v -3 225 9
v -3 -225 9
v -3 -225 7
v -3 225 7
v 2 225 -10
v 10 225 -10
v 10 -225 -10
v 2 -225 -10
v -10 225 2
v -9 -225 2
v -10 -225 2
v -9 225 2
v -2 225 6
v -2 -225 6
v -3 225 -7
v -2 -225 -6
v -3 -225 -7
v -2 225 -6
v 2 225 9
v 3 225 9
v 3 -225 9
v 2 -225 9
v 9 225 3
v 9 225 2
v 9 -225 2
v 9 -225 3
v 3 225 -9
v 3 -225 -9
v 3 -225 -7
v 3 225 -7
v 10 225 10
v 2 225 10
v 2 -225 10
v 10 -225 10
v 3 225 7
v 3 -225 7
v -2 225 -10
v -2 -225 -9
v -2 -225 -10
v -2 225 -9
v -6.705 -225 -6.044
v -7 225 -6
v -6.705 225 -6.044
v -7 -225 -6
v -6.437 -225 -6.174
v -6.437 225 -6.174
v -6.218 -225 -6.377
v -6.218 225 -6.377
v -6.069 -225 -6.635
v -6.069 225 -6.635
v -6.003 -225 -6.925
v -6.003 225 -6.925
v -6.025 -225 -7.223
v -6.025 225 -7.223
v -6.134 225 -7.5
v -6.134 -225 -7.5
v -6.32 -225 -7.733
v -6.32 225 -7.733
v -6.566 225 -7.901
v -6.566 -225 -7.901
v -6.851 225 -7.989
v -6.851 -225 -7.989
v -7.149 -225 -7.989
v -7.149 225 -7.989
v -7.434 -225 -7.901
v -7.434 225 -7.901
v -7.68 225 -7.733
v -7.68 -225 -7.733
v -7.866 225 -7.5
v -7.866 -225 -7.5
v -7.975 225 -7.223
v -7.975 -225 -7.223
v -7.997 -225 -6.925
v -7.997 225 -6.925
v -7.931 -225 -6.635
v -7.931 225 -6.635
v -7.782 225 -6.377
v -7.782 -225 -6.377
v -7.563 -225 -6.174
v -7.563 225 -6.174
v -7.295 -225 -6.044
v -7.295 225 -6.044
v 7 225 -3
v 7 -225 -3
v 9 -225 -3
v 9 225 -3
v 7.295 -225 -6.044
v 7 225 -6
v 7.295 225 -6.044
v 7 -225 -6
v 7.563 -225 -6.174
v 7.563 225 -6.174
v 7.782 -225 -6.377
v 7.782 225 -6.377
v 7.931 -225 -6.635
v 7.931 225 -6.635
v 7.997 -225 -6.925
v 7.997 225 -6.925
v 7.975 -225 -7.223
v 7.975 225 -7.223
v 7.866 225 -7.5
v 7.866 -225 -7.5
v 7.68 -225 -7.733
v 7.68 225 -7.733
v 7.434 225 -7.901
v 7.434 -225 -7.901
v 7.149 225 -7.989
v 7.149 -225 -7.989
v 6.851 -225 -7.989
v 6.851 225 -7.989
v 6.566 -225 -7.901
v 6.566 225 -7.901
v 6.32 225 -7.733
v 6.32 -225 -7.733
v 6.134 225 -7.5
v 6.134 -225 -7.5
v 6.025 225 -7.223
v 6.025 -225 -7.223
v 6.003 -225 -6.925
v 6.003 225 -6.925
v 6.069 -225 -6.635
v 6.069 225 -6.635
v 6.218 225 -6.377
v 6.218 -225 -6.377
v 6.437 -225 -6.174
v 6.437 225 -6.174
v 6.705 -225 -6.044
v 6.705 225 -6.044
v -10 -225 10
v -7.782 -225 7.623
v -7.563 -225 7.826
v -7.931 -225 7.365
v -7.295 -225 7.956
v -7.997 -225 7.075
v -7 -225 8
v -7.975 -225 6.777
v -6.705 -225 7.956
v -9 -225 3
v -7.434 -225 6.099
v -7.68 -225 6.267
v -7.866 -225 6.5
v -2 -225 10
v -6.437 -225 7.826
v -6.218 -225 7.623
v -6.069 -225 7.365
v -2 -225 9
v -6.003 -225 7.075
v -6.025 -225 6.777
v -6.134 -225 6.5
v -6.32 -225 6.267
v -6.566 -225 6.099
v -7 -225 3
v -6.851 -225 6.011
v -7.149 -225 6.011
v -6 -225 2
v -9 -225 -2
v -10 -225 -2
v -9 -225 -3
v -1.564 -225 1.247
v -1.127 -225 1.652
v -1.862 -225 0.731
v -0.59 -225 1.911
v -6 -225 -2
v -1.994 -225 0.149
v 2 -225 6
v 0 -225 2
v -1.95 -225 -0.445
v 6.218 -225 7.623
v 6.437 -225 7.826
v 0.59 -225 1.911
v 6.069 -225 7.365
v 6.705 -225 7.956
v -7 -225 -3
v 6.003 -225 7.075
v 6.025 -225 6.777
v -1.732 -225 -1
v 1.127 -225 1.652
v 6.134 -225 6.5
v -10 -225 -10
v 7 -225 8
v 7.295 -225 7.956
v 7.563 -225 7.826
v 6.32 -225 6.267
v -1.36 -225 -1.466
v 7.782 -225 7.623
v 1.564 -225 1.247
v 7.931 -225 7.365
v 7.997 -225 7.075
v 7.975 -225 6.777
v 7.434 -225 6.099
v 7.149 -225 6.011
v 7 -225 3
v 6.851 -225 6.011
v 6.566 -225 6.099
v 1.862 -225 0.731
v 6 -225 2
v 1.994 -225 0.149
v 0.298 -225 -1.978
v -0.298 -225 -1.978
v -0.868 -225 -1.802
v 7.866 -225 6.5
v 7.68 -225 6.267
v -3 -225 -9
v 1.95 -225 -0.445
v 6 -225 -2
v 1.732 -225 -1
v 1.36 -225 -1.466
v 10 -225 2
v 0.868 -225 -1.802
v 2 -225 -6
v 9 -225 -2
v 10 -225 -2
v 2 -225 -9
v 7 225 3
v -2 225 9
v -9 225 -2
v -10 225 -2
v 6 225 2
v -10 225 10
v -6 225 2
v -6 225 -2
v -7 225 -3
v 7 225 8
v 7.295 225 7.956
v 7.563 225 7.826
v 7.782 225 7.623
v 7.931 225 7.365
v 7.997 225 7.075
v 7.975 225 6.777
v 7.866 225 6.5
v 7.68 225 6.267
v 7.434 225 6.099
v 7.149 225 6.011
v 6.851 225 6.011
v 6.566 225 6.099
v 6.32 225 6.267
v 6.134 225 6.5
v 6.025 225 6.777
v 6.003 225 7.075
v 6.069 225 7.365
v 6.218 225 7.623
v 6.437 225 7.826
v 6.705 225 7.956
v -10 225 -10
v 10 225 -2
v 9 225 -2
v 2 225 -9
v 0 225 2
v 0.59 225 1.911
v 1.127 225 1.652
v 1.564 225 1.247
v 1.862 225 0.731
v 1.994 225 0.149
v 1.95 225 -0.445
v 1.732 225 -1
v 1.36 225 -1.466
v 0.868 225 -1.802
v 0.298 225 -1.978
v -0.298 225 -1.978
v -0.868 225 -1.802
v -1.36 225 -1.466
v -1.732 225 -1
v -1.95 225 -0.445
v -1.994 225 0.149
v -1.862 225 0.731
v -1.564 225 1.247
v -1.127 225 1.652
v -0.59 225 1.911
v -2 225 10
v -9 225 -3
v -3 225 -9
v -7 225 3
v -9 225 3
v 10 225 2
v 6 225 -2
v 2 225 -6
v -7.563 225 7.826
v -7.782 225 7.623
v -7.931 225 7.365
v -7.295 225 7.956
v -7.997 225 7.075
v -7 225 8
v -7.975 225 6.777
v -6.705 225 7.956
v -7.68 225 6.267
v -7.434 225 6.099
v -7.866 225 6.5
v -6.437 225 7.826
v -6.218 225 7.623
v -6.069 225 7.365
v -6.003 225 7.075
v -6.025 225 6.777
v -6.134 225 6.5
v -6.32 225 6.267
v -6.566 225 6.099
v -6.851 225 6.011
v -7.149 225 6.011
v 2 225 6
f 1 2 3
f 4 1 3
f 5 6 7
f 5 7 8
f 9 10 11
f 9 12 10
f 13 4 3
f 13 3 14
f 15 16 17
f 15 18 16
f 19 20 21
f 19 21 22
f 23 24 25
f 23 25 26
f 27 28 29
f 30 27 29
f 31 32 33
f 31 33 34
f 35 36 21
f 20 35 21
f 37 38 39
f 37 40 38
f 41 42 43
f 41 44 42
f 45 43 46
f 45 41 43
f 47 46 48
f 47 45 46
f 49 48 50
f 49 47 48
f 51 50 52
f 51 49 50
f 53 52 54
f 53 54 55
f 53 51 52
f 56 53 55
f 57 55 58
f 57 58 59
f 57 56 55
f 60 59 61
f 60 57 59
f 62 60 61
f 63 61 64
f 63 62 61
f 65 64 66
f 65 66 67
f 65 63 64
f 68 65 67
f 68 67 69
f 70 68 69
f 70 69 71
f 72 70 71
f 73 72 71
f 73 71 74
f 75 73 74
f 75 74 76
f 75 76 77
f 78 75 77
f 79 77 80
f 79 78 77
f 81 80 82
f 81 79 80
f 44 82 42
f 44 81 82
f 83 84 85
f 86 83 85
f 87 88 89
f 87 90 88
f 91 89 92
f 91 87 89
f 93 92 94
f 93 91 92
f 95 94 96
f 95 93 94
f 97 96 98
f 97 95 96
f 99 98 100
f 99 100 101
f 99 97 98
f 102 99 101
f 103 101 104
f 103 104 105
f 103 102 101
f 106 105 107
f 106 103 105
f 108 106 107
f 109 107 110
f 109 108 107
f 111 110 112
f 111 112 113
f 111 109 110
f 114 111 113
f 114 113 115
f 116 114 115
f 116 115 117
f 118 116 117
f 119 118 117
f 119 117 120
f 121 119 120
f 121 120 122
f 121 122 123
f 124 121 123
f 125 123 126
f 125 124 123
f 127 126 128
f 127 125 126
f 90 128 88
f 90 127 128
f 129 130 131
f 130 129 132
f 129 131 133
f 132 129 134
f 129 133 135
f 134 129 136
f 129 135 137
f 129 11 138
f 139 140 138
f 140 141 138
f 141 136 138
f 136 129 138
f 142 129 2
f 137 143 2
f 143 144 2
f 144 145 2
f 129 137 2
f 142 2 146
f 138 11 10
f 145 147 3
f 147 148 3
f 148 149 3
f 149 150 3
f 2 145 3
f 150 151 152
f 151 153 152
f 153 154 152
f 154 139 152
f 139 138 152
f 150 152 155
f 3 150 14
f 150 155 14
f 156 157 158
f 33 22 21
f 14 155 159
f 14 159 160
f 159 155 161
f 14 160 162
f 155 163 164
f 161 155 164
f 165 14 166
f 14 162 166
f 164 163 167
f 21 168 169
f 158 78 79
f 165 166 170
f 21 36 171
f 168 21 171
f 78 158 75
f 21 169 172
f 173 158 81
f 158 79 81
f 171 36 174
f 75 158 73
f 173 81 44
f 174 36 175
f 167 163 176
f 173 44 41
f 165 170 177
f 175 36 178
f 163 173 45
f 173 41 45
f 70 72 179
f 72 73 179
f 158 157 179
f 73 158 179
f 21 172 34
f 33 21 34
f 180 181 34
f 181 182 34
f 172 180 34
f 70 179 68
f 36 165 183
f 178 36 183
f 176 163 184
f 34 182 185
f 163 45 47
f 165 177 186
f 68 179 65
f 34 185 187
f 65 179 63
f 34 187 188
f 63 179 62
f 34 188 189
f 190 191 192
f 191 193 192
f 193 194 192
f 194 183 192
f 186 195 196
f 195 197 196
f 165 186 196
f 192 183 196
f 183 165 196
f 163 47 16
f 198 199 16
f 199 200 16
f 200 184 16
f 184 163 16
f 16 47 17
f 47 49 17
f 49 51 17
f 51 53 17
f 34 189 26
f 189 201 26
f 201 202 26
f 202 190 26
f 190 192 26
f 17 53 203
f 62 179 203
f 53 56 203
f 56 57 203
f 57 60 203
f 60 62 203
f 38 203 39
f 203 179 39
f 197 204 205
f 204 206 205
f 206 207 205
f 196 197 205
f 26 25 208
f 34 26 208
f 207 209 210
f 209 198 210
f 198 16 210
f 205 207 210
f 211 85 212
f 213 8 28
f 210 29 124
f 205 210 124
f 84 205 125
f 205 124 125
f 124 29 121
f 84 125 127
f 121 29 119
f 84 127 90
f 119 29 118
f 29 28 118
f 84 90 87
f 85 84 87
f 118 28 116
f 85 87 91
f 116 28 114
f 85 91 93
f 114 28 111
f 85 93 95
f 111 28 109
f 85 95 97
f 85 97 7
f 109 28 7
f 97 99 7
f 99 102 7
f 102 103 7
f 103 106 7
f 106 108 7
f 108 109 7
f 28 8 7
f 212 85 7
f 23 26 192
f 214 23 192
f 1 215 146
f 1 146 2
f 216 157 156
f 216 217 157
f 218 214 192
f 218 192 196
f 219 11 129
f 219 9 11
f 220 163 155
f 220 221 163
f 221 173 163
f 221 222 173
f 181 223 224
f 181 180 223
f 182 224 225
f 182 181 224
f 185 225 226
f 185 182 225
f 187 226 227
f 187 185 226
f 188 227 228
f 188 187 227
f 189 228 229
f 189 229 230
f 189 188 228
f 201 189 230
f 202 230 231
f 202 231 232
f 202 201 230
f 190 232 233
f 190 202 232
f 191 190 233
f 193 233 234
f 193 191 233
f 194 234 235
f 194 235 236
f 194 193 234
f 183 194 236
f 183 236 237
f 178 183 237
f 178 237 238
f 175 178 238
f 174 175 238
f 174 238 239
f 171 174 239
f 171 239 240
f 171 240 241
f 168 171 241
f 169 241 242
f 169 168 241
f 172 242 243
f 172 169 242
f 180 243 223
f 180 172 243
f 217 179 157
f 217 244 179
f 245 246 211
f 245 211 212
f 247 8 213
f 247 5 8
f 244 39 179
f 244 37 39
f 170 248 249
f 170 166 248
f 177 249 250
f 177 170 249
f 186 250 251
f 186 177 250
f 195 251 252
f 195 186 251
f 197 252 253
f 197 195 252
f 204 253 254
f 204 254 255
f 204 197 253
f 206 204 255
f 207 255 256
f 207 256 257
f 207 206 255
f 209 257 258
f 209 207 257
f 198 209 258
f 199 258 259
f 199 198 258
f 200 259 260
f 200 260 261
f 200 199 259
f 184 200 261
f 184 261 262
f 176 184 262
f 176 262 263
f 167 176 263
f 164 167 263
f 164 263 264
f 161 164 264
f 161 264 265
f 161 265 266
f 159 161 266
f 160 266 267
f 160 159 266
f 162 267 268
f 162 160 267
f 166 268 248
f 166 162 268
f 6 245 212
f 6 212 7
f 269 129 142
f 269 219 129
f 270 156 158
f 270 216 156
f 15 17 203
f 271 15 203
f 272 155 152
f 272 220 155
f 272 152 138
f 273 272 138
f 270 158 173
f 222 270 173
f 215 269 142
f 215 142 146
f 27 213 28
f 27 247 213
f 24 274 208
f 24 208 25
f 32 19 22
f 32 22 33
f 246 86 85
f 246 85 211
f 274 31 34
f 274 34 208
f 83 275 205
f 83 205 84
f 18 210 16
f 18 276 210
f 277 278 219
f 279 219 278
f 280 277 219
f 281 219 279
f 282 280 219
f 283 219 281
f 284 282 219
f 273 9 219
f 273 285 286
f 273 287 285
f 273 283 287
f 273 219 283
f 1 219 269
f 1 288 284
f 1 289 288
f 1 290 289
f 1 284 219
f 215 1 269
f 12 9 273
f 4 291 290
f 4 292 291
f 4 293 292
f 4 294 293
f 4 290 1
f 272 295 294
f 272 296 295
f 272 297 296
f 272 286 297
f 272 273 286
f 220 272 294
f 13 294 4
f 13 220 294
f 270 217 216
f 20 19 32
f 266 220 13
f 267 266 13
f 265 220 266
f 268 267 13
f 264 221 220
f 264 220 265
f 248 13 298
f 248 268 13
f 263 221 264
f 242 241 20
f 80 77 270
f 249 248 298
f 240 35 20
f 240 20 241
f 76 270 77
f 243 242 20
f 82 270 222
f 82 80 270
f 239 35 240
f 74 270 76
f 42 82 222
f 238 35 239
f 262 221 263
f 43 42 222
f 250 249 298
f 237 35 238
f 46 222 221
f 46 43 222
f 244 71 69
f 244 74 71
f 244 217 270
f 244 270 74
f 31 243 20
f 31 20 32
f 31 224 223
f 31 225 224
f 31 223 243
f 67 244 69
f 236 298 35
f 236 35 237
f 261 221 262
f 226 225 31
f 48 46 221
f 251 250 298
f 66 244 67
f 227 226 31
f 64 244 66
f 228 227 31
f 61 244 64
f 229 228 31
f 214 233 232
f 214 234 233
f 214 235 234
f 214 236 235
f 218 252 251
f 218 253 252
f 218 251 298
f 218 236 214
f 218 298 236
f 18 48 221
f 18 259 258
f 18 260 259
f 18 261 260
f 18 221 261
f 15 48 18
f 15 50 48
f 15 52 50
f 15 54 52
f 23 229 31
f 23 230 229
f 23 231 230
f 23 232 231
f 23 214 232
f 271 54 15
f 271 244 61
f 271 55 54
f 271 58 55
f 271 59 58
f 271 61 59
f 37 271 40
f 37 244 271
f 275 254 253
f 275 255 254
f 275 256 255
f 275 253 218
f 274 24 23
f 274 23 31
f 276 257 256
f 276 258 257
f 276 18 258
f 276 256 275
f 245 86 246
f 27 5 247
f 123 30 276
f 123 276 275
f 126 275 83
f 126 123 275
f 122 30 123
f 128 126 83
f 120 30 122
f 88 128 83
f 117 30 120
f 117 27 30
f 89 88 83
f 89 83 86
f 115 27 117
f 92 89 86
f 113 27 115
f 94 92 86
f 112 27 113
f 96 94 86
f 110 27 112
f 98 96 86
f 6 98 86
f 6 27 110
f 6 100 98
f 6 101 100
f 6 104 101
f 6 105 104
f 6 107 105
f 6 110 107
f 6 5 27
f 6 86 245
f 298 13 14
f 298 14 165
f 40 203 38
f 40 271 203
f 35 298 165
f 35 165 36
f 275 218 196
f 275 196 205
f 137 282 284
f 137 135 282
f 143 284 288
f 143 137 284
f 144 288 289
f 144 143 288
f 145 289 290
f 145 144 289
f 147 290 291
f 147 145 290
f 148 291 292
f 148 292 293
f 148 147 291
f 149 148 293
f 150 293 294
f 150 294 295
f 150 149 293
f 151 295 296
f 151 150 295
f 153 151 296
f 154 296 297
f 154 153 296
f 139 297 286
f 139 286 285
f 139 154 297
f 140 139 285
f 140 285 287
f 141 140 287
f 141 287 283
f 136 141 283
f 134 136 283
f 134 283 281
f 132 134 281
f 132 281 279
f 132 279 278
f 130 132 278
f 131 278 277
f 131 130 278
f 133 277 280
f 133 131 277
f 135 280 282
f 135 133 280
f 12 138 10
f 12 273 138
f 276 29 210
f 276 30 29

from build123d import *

# Parameters (mm, degrees)
SKETCH_1_R      = 2
SKETCH_1_R_2    = 1
EXTRUDE_1_DEPTH = 225


with BuildPart() as part:
    # 草圖1 → 填料-伸長1 (new, symmetric)
    with BuildSketch(Plane(origin=(0, 0, 0), x_dir=(1, 0, 0), z_dir=(0, 1, 0))):
        Polygon((-10, -10), (-2, -10), (-2, -9), (-3, -9), (-3, -7), (-2, -6), (2, -6), (3, -7), (3, -9), (2, -9), (2, -10), (10, -10), (10, -2), (9, -2), (9, -3), (7, -3), (6, -2), (6, 2), (7, 3), (9, 3), (9, 2), (10, 2), (10, 10), (2, 10), (2, 9), (3, 9), (3, 7), (2, 6), (-2, 6), (-3, 7), (-3, 9), (-2, 9), (-2, 10), (-10, 10), (-10, 2), (-9, 2), (-9, 3), (-7, 3), (-6, 2), (-6, -2), (-7, -3), (-9, -3), (-9, -2), (-10, -2), align=None)
        with Locations(Location((0, 0, 0), (0, 0, 270))):
            Circle(SKETCH_1_R, mode=Mode.SUBTRACT)
        with Locations(Location((-7, 7, 0), (0, 0, 270))):
            Circle(SKETCH_1_R_2, mode=Mode.SUBTRACT)
        with Locations(Location((7, 7, 0), (0, 0, 270))):
            Circle(SKETCH_1_R_2, mode=Mode.SUBTRACT)
        with Locations(Location((7, -7, 0), (0, 0, 270))):
            Circle(SKETCH_1_R_2, mode=Mode.SUBTRACT)
        with Locations(Location((-7, -7, 0), (0, 0, 270))):
            Circle(SKETCH_1_R_2, mode=Mode.SUBTRACT)
    extrude(amount=EXTRUDE_1_DEPTH, both=True)


solid = part.part
